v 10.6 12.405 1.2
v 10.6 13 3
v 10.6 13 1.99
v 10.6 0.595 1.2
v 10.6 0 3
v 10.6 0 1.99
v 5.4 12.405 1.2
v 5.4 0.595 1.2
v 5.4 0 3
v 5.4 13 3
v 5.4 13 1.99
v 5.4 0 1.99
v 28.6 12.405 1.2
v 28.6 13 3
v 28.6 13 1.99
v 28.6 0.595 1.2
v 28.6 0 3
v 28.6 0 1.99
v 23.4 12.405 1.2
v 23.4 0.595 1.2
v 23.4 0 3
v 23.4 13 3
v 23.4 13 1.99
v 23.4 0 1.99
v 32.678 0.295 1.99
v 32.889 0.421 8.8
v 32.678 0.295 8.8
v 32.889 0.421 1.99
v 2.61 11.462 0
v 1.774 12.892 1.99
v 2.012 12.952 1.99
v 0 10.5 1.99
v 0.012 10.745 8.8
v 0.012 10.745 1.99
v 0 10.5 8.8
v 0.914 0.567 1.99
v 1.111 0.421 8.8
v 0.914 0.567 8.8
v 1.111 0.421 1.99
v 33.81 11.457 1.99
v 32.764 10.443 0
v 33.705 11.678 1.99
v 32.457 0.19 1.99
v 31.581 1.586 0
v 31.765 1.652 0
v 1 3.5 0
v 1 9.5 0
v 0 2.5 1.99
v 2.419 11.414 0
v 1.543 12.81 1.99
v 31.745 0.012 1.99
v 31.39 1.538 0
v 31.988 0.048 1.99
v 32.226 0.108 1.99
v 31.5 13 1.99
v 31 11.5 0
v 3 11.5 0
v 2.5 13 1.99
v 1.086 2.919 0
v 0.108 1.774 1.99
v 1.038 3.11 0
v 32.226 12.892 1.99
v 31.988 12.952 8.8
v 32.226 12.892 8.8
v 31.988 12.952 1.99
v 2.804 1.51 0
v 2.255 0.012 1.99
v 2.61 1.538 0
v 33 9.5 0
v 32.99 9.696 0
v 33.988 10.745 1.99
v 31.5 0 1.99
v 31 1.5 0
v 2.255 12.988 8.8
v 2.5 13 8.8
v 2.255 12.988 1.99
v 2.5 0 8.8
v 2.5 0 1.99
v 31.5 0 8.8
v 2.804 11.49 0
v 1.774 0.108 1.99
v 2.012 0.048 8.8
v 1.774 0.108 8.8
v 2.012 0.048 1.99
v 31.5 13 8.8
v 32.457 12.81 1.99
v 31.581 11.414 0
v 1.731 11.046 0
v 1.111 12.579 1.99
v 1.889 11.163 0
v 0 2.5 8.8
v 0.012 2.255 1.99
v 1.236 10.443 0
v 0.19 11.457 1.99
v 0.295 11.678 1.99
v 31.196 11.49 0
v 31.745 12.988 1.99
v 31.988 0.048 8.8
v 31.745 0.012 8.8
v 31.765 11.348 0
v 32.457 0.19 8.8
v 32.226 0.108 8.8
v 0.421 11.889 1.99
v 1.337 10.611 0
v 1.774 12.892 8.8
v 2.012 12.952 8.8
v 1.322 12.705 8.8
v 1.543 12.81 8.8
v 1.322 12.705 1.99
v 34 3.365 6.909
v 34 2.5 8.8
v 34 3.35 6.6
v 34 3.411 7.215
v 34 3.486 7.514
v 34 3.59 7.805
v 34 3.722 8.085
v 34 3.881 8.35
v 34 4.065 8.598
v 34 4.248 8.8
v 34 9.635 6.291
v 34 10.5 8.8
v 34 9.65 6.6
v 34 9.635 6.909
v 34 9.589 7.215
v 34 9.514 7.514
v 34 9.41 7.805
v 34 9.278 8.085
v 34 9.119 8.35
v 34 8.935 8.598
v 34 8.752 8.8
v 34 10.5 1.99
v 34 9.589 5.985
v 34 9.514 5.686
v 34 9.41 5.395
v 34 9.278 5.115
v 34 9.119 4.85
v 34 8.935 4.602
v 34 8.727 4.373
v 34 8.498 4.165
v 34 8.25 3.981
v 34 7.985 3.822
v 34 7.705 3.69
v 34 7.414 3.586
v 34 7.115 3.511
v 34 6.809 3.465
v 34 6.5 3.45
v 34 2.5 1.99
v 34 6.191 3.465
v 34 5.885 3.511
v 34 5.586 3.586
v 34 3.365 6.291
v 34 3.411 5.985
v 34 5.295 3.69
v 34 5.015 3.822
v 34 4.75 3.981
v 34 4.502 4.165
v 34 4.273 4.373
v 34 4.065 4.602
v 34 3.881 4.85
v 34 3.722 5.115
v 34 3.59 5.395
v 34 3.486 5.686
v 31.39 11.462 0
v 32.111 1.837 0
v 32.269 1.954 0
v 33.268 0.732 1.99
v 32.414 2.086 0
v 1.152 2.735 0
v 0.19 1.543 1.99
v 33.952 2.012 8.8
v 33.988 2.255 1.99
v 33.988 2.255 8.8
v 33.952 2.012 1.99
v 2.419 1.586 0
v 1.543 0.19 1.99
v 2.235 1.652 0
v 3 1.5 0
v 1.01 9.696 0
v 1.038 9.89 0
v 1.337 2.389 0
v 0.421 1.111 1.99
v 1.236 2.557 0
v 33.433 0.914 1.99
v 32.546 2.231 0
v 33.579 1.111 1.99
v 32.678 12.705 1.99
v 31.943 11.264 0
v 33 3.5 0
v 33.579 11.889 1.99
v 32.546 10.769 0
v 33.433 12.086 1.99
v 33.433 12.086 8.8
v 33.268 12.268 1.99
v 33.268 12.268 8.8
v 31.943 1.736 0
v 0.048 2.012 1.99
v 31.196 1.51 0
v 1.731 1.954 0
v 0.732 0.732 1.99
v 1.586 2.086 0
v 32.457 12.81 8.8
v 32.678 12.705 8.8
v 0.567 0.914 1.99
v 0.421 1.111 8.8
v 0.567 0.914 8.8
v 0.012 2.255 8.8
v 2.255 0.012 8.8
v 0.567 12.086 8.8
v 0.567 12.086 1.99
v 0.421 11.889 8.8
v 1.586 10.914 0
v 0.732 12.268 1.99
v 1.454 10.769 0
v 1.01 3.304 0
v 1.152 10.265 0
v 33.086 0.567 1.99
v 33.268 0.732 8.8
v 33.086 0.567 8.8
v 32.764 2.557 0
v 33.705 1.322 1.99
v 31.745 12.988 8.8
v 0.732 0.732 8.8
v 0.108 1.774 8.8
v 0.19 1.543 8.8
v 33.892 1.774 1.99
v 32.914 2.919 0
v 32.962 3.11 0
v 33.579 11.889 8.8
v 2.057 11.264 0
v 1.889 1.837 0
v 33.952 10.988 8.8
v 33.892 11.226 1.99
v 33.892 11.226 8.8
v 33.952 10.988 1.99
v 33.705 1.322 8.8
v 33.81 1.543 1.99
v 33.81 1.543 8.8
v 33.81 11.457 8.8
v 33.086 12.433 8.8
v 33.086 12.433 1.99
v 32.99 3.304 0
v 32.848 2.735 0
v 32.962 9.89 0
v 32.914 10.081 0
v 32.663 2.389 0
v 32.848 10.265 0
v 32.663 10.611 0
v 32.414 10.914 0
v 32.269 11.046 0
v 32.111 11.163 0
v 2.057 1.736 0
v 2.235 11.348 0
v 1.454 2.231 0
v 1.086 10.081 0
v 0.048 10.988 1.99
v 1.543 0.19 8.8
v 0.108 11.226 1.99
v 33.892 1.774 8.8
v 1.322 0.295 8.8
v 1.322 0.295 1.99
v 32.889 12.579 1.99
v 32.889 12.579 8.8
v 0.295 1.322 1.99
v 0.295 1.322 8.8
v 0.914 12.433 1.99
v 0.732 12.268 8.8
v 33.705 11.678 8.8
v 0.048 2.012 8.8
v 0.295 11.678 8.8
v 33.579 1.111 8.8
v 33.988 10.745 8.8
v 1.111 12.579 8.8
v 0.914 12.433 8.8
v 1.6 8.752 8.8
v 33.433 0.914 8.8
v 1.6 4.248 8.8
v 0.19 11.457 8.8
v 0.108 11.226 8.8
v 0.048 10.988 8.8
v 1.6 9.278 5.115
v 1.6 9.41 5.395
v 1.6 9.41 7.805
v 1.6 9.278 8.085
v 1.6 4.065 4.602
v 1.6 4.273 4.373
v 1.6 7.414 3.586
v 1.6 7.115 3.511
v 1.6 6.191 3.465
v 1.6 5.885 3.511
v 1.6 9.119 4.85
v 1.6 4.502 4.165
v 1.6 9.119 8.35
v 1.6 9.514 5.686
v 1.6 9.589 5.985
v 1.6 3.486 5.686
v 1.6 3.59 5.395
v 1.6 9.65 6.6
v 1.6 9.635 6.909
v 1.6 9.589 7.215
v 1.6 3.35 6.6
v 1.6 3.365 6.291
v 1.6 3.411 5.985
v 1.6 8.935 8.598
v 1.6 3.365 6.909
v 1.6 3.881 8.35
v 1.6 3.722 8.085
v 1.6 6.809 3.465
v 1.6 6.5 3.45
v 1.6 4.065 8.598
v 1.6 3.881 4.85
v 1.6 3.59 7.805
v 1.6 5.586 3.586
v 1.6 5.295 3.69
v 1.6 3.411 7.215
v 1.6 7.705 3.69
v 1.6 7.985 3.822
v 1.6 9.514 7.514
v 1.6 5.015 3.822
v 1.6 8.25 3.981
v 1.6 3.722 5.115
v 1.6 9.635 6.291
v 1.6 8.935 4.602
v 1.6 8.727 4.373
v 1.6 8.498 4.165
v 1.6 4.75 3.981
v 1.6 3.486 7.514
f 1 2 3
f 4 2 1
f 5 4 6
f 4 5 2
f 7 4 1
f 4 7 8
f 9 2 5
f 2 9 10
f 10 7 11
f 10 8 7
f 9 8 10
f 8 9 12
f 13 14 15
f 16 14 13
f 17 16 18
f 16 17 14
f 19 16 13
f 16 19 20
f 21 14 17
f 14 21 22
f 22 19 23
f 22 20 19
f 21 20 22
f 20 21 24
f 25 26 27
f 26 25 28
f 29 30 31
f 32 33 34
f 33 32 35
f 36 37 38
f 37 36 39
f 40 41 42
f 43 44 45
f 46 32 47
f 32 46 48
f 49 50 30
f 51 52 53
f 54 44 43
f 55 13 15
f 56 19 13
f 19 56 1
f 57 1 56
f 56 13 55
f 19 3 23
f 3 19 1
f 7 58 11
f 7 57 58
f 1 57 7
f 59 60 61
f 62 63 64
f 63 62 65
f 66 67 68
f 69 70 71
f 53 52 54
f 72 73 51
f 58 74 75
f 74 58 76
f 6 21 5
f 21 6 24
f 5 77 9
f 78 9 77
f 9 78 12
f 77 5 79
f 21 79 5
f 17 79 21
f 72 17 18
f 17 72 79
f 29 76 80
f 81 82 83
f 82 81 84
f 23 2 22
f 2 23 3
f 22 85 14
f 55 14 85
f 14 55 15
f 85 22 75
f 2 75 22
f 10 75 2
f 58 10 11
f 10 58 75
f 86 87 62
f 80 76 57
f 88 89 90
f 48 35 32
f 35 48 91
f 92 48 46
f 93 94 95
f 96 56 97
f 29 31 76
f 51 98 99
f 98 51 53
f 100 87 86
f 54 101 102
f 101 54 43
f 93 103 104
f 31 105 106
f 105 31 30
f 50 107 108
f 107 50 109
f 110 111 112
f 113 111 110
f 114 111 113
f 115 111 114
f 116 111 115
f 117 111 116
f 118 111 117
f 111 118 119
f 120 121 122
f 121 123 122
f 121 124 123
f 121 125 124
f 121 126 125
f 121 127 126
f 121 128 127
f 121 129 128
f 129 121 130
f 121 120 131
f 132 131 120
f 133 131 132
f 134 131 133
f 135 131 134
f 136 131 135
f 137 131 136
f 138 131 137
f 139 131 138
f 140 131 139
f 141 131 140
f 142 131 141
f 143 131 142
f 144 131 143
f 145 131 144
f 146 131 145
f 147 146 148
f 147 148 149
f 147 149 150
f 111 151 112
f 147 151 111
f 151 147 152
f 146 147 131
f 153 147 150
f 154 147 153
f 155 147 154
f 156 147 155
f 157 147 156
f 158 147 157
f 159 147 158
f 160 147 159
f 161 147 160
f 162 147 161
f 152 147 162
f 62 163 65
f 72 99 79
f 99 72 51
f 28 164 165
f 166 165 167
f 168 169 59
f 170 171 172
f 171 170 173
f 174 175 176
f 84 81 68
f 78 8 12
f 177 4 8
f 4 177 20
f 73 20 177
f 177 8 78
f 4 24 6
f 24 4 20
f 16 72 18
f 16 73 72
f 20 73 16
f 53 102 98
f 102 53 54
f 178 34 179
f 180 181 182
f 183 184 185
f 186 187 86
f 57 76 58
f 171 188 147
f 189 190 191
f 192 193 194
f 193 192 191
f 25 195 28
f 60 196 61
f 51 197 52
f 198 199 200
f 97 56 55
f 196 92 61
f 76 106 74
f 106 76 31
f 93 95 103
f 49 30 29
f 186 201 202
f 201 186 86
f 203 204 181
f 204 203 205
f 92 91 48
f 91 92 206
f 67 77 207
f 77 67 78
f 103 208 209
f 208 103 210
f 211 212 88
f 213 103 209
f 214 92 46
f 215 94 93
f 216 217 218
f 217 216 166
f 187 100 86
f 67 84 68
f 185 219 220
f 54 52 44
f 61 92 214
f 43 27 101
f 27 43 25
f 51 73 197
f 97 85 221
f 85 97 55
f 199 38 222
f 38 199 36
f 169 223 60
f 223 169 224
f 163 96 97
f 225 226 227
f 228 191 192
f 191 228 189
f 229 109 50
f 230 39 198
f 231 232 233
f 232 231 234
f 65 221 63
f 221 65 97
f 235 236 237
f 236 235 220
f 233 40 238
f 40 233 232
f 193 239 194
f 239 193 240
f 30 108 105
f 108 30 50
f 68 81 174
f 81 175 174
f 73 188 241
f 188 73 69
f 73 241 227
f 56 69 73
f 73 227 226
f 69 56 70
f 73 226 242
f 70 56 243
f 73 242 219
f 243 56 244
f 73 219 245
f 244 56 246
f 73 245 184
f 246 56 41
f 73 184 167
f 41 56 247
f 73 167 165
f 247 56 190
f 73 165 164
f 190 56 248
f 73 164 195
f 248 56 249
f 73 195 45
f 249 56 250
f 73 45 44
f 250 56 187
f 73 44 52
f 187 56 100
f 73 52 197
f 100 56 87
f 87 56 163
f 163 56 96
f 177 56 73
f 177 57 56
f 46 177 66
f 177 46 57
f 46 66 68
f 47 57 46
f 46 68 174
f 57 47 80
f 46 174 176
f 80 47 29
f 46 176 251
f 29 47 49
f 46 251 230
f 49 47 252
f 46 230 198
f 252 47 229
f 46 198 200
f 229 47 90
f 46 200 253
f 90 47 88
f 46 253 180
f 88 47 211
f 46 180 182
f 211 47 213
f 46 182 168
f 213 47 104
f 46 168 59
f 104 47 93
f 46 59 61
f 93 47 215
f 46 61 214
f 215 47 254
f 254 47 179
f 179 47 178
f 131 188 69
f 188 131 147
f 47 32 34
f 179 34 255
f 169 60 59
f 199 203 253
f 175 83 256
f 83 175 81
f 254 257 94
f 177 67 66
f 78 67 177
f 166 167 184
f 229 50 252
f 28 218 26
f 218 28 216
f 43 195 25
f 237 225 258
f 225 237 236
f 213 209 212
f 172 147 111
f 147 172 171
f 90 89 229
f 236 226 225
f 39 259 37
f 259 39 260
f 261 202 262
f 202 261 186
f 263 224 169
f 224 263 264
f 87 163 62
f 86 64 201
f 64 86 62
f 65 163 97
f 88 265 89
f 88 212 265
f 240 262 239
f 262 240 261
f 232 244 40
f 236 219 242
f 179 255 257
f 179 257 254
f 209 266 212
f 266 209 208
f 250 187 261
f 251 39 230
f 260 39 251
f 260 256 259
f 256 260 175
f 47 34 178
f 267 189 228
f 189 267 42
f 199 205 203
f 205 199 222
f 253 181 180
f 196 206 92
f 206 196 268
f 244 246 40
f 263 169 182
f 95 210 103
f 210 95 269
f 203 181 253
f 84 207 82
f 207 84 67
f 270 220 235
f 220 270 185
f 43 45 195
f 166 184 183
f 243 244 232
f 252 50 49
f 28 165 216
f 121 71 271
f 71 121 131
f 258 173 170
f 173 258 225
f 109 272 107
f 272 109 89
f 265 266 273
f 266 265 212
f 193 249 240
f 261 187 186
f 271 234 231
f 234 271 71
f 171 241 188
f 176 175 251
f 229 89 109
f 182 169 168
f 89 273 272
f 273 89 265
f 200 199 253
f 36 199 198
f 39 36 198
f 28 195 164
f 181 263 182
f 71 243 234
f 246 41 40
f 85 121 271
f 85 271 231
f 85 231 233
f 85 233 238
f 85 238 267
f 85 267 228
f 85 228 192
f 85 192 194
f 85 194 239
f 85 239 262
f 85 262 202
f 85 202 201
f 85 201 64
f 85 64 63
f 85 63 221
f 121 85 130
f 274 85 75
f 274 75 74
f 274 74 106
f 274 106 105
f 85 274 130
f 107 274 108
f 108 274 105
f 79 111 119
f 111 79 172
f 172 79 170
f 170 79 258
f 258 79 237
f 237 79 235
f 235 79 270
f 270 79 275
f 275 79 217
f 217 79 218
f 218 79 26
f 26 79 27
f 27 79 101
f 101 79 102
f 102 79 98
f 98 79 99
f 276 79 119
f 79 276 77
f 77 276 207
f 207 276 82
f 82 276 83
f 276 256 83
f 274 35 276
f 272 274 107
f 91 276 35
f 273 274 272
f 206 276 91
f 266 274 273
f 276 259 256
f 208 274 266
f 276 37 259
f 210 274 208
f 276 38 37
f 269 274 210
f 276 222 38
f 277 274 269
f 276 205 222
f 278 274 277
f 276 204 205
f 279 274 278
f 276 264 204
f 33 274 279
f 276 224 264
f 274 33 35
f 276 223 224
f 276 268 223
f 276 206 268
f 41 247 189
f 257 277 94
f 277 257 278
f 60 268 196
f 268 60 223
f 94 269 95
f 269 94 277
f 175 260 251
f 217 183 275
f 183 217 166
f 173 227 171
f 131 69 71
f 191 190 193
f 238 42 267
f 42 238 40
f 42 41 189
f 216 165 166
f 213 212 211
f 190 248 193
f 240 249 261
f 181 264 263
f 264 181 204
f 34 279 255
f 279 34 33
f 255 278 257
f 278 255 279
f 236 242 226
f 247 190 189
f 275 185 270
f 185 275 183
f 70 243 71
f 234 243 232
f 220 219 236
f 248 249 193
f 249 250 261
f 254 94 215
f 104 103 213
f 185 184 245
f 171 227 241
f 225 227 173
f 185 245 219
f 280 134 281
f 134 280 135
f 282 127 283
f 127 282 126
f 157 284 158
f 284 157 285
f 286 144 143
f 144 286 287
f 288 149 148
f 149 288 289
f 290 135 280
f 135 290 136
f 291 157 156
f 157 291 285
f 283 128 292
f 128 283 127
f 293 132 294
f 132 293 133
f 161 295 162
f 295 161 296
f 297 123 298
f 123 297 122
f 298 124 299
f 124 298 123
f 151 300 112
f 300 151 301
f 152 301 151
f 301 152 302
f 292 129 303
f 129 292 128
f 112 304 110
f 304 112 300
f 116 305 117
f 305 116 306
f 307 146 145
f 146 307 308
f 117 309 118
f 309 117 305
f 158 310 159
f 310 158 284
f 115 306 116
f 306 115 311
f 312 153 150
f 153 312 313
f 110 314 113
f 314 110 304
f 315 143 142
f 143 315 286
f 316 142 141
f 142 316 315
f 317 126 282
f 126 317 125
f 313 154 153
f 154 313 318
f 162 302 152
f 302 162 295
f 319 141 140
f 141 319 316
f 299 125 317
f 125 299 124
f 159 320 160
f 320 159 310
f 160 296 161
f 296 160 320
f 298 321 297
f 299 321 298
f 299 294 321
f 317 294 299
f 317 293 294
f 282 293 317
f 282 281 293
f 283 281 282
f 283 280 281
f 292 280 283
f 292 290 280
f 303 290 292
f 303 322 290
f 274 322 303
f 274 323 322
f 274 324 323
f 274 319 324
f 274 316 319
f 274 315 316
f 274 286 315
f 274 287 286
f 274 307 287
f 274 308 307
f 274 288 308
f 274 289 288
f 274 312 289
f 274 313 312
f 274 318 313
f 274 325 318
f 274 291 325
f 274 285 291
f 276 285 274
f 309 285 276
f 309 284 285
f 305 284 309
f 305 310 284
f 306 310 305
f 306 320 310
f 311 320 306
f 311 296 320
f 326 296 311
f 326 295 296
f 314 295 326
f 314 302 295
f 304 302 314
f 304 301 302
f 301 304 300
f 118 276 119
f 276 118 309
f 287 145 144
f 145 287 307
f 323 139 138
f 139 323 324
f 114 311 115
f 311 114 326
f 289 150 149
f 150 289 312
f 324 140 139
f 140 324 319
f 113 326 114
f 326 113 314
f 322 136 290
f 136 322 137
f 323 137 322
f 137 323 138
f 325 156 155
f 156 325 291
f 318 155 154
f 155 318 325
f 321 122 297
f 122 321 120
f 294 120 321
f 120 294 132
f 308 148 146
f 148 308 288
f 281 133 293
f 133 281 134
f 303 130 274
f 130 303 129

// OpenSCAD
// DS18B20 pipe holder, cable tie mount. See docs/ds18b20-pipe-holder.md
// Print in PETG or ASA (not PLA: supply water reaches 60 to 75 °C), flat top on the bed.

probe_d   = 6.0;   // measure your probe sleeve
length    = 34;    // holder length (probe is 50 mm)
width     = 13;
protrude  = 0.8;   // how far the probe sticks out under the holder
end_wall  = 1.6;   // tip stop
tie_w     = 5.2;   // fits 4.8 mm ties (and 3.6 mm)
tie_h     = 1.8;   // tunnel height, tie thickness about 1.2 mm
roof      = 1.2;
tie_inset = 8;     // tunnel centre from each end
clear     = 0.15;
print_orientation = true;   // true: flat top on the bed, ready to export as STL

$fn = 64;
pr    = probe_d/2;
z_tun = probe_d + 0.6;
z_top = z_tun + tie_h + roof;

module rr(w, h, r) hull() for (sx=[-1,1], sy=[-1,1]) translate([sx*(w/2-r), sy*(h/2-r)]) circle(r);

module holder() difference() {
  hull() {
    translate([length/2, 0, protrude]) linear_extrude(0.01) rr(length, width, 2.5);
    translate([length/2, 0, z_top-2])  linear_extrude(0.01) rr(length, width, 2.5);
    translate([length/2, 0, z_top-0.01]) linear_extrude(0.01) rr(length-2, width-3, 2.0);
  }
  translate([end_wall, 0, pr]) rotate([0, 90, 0]) cylinder(r = pr + clear, h = length);
  translate([end_wall, -2, -1]) cube([length, 4, protrude + 1]);
  for (x = [tie_inset, length - tie_inset])
    translate([x - tie_w/2, -width/2 - 1, z_tun]) cube([tie_w, width + 2, tie_h]);
}

if (print_orientation) translate([0, width/2, z_top]) rotate([180, 0, 0]) holder();
else holder();
